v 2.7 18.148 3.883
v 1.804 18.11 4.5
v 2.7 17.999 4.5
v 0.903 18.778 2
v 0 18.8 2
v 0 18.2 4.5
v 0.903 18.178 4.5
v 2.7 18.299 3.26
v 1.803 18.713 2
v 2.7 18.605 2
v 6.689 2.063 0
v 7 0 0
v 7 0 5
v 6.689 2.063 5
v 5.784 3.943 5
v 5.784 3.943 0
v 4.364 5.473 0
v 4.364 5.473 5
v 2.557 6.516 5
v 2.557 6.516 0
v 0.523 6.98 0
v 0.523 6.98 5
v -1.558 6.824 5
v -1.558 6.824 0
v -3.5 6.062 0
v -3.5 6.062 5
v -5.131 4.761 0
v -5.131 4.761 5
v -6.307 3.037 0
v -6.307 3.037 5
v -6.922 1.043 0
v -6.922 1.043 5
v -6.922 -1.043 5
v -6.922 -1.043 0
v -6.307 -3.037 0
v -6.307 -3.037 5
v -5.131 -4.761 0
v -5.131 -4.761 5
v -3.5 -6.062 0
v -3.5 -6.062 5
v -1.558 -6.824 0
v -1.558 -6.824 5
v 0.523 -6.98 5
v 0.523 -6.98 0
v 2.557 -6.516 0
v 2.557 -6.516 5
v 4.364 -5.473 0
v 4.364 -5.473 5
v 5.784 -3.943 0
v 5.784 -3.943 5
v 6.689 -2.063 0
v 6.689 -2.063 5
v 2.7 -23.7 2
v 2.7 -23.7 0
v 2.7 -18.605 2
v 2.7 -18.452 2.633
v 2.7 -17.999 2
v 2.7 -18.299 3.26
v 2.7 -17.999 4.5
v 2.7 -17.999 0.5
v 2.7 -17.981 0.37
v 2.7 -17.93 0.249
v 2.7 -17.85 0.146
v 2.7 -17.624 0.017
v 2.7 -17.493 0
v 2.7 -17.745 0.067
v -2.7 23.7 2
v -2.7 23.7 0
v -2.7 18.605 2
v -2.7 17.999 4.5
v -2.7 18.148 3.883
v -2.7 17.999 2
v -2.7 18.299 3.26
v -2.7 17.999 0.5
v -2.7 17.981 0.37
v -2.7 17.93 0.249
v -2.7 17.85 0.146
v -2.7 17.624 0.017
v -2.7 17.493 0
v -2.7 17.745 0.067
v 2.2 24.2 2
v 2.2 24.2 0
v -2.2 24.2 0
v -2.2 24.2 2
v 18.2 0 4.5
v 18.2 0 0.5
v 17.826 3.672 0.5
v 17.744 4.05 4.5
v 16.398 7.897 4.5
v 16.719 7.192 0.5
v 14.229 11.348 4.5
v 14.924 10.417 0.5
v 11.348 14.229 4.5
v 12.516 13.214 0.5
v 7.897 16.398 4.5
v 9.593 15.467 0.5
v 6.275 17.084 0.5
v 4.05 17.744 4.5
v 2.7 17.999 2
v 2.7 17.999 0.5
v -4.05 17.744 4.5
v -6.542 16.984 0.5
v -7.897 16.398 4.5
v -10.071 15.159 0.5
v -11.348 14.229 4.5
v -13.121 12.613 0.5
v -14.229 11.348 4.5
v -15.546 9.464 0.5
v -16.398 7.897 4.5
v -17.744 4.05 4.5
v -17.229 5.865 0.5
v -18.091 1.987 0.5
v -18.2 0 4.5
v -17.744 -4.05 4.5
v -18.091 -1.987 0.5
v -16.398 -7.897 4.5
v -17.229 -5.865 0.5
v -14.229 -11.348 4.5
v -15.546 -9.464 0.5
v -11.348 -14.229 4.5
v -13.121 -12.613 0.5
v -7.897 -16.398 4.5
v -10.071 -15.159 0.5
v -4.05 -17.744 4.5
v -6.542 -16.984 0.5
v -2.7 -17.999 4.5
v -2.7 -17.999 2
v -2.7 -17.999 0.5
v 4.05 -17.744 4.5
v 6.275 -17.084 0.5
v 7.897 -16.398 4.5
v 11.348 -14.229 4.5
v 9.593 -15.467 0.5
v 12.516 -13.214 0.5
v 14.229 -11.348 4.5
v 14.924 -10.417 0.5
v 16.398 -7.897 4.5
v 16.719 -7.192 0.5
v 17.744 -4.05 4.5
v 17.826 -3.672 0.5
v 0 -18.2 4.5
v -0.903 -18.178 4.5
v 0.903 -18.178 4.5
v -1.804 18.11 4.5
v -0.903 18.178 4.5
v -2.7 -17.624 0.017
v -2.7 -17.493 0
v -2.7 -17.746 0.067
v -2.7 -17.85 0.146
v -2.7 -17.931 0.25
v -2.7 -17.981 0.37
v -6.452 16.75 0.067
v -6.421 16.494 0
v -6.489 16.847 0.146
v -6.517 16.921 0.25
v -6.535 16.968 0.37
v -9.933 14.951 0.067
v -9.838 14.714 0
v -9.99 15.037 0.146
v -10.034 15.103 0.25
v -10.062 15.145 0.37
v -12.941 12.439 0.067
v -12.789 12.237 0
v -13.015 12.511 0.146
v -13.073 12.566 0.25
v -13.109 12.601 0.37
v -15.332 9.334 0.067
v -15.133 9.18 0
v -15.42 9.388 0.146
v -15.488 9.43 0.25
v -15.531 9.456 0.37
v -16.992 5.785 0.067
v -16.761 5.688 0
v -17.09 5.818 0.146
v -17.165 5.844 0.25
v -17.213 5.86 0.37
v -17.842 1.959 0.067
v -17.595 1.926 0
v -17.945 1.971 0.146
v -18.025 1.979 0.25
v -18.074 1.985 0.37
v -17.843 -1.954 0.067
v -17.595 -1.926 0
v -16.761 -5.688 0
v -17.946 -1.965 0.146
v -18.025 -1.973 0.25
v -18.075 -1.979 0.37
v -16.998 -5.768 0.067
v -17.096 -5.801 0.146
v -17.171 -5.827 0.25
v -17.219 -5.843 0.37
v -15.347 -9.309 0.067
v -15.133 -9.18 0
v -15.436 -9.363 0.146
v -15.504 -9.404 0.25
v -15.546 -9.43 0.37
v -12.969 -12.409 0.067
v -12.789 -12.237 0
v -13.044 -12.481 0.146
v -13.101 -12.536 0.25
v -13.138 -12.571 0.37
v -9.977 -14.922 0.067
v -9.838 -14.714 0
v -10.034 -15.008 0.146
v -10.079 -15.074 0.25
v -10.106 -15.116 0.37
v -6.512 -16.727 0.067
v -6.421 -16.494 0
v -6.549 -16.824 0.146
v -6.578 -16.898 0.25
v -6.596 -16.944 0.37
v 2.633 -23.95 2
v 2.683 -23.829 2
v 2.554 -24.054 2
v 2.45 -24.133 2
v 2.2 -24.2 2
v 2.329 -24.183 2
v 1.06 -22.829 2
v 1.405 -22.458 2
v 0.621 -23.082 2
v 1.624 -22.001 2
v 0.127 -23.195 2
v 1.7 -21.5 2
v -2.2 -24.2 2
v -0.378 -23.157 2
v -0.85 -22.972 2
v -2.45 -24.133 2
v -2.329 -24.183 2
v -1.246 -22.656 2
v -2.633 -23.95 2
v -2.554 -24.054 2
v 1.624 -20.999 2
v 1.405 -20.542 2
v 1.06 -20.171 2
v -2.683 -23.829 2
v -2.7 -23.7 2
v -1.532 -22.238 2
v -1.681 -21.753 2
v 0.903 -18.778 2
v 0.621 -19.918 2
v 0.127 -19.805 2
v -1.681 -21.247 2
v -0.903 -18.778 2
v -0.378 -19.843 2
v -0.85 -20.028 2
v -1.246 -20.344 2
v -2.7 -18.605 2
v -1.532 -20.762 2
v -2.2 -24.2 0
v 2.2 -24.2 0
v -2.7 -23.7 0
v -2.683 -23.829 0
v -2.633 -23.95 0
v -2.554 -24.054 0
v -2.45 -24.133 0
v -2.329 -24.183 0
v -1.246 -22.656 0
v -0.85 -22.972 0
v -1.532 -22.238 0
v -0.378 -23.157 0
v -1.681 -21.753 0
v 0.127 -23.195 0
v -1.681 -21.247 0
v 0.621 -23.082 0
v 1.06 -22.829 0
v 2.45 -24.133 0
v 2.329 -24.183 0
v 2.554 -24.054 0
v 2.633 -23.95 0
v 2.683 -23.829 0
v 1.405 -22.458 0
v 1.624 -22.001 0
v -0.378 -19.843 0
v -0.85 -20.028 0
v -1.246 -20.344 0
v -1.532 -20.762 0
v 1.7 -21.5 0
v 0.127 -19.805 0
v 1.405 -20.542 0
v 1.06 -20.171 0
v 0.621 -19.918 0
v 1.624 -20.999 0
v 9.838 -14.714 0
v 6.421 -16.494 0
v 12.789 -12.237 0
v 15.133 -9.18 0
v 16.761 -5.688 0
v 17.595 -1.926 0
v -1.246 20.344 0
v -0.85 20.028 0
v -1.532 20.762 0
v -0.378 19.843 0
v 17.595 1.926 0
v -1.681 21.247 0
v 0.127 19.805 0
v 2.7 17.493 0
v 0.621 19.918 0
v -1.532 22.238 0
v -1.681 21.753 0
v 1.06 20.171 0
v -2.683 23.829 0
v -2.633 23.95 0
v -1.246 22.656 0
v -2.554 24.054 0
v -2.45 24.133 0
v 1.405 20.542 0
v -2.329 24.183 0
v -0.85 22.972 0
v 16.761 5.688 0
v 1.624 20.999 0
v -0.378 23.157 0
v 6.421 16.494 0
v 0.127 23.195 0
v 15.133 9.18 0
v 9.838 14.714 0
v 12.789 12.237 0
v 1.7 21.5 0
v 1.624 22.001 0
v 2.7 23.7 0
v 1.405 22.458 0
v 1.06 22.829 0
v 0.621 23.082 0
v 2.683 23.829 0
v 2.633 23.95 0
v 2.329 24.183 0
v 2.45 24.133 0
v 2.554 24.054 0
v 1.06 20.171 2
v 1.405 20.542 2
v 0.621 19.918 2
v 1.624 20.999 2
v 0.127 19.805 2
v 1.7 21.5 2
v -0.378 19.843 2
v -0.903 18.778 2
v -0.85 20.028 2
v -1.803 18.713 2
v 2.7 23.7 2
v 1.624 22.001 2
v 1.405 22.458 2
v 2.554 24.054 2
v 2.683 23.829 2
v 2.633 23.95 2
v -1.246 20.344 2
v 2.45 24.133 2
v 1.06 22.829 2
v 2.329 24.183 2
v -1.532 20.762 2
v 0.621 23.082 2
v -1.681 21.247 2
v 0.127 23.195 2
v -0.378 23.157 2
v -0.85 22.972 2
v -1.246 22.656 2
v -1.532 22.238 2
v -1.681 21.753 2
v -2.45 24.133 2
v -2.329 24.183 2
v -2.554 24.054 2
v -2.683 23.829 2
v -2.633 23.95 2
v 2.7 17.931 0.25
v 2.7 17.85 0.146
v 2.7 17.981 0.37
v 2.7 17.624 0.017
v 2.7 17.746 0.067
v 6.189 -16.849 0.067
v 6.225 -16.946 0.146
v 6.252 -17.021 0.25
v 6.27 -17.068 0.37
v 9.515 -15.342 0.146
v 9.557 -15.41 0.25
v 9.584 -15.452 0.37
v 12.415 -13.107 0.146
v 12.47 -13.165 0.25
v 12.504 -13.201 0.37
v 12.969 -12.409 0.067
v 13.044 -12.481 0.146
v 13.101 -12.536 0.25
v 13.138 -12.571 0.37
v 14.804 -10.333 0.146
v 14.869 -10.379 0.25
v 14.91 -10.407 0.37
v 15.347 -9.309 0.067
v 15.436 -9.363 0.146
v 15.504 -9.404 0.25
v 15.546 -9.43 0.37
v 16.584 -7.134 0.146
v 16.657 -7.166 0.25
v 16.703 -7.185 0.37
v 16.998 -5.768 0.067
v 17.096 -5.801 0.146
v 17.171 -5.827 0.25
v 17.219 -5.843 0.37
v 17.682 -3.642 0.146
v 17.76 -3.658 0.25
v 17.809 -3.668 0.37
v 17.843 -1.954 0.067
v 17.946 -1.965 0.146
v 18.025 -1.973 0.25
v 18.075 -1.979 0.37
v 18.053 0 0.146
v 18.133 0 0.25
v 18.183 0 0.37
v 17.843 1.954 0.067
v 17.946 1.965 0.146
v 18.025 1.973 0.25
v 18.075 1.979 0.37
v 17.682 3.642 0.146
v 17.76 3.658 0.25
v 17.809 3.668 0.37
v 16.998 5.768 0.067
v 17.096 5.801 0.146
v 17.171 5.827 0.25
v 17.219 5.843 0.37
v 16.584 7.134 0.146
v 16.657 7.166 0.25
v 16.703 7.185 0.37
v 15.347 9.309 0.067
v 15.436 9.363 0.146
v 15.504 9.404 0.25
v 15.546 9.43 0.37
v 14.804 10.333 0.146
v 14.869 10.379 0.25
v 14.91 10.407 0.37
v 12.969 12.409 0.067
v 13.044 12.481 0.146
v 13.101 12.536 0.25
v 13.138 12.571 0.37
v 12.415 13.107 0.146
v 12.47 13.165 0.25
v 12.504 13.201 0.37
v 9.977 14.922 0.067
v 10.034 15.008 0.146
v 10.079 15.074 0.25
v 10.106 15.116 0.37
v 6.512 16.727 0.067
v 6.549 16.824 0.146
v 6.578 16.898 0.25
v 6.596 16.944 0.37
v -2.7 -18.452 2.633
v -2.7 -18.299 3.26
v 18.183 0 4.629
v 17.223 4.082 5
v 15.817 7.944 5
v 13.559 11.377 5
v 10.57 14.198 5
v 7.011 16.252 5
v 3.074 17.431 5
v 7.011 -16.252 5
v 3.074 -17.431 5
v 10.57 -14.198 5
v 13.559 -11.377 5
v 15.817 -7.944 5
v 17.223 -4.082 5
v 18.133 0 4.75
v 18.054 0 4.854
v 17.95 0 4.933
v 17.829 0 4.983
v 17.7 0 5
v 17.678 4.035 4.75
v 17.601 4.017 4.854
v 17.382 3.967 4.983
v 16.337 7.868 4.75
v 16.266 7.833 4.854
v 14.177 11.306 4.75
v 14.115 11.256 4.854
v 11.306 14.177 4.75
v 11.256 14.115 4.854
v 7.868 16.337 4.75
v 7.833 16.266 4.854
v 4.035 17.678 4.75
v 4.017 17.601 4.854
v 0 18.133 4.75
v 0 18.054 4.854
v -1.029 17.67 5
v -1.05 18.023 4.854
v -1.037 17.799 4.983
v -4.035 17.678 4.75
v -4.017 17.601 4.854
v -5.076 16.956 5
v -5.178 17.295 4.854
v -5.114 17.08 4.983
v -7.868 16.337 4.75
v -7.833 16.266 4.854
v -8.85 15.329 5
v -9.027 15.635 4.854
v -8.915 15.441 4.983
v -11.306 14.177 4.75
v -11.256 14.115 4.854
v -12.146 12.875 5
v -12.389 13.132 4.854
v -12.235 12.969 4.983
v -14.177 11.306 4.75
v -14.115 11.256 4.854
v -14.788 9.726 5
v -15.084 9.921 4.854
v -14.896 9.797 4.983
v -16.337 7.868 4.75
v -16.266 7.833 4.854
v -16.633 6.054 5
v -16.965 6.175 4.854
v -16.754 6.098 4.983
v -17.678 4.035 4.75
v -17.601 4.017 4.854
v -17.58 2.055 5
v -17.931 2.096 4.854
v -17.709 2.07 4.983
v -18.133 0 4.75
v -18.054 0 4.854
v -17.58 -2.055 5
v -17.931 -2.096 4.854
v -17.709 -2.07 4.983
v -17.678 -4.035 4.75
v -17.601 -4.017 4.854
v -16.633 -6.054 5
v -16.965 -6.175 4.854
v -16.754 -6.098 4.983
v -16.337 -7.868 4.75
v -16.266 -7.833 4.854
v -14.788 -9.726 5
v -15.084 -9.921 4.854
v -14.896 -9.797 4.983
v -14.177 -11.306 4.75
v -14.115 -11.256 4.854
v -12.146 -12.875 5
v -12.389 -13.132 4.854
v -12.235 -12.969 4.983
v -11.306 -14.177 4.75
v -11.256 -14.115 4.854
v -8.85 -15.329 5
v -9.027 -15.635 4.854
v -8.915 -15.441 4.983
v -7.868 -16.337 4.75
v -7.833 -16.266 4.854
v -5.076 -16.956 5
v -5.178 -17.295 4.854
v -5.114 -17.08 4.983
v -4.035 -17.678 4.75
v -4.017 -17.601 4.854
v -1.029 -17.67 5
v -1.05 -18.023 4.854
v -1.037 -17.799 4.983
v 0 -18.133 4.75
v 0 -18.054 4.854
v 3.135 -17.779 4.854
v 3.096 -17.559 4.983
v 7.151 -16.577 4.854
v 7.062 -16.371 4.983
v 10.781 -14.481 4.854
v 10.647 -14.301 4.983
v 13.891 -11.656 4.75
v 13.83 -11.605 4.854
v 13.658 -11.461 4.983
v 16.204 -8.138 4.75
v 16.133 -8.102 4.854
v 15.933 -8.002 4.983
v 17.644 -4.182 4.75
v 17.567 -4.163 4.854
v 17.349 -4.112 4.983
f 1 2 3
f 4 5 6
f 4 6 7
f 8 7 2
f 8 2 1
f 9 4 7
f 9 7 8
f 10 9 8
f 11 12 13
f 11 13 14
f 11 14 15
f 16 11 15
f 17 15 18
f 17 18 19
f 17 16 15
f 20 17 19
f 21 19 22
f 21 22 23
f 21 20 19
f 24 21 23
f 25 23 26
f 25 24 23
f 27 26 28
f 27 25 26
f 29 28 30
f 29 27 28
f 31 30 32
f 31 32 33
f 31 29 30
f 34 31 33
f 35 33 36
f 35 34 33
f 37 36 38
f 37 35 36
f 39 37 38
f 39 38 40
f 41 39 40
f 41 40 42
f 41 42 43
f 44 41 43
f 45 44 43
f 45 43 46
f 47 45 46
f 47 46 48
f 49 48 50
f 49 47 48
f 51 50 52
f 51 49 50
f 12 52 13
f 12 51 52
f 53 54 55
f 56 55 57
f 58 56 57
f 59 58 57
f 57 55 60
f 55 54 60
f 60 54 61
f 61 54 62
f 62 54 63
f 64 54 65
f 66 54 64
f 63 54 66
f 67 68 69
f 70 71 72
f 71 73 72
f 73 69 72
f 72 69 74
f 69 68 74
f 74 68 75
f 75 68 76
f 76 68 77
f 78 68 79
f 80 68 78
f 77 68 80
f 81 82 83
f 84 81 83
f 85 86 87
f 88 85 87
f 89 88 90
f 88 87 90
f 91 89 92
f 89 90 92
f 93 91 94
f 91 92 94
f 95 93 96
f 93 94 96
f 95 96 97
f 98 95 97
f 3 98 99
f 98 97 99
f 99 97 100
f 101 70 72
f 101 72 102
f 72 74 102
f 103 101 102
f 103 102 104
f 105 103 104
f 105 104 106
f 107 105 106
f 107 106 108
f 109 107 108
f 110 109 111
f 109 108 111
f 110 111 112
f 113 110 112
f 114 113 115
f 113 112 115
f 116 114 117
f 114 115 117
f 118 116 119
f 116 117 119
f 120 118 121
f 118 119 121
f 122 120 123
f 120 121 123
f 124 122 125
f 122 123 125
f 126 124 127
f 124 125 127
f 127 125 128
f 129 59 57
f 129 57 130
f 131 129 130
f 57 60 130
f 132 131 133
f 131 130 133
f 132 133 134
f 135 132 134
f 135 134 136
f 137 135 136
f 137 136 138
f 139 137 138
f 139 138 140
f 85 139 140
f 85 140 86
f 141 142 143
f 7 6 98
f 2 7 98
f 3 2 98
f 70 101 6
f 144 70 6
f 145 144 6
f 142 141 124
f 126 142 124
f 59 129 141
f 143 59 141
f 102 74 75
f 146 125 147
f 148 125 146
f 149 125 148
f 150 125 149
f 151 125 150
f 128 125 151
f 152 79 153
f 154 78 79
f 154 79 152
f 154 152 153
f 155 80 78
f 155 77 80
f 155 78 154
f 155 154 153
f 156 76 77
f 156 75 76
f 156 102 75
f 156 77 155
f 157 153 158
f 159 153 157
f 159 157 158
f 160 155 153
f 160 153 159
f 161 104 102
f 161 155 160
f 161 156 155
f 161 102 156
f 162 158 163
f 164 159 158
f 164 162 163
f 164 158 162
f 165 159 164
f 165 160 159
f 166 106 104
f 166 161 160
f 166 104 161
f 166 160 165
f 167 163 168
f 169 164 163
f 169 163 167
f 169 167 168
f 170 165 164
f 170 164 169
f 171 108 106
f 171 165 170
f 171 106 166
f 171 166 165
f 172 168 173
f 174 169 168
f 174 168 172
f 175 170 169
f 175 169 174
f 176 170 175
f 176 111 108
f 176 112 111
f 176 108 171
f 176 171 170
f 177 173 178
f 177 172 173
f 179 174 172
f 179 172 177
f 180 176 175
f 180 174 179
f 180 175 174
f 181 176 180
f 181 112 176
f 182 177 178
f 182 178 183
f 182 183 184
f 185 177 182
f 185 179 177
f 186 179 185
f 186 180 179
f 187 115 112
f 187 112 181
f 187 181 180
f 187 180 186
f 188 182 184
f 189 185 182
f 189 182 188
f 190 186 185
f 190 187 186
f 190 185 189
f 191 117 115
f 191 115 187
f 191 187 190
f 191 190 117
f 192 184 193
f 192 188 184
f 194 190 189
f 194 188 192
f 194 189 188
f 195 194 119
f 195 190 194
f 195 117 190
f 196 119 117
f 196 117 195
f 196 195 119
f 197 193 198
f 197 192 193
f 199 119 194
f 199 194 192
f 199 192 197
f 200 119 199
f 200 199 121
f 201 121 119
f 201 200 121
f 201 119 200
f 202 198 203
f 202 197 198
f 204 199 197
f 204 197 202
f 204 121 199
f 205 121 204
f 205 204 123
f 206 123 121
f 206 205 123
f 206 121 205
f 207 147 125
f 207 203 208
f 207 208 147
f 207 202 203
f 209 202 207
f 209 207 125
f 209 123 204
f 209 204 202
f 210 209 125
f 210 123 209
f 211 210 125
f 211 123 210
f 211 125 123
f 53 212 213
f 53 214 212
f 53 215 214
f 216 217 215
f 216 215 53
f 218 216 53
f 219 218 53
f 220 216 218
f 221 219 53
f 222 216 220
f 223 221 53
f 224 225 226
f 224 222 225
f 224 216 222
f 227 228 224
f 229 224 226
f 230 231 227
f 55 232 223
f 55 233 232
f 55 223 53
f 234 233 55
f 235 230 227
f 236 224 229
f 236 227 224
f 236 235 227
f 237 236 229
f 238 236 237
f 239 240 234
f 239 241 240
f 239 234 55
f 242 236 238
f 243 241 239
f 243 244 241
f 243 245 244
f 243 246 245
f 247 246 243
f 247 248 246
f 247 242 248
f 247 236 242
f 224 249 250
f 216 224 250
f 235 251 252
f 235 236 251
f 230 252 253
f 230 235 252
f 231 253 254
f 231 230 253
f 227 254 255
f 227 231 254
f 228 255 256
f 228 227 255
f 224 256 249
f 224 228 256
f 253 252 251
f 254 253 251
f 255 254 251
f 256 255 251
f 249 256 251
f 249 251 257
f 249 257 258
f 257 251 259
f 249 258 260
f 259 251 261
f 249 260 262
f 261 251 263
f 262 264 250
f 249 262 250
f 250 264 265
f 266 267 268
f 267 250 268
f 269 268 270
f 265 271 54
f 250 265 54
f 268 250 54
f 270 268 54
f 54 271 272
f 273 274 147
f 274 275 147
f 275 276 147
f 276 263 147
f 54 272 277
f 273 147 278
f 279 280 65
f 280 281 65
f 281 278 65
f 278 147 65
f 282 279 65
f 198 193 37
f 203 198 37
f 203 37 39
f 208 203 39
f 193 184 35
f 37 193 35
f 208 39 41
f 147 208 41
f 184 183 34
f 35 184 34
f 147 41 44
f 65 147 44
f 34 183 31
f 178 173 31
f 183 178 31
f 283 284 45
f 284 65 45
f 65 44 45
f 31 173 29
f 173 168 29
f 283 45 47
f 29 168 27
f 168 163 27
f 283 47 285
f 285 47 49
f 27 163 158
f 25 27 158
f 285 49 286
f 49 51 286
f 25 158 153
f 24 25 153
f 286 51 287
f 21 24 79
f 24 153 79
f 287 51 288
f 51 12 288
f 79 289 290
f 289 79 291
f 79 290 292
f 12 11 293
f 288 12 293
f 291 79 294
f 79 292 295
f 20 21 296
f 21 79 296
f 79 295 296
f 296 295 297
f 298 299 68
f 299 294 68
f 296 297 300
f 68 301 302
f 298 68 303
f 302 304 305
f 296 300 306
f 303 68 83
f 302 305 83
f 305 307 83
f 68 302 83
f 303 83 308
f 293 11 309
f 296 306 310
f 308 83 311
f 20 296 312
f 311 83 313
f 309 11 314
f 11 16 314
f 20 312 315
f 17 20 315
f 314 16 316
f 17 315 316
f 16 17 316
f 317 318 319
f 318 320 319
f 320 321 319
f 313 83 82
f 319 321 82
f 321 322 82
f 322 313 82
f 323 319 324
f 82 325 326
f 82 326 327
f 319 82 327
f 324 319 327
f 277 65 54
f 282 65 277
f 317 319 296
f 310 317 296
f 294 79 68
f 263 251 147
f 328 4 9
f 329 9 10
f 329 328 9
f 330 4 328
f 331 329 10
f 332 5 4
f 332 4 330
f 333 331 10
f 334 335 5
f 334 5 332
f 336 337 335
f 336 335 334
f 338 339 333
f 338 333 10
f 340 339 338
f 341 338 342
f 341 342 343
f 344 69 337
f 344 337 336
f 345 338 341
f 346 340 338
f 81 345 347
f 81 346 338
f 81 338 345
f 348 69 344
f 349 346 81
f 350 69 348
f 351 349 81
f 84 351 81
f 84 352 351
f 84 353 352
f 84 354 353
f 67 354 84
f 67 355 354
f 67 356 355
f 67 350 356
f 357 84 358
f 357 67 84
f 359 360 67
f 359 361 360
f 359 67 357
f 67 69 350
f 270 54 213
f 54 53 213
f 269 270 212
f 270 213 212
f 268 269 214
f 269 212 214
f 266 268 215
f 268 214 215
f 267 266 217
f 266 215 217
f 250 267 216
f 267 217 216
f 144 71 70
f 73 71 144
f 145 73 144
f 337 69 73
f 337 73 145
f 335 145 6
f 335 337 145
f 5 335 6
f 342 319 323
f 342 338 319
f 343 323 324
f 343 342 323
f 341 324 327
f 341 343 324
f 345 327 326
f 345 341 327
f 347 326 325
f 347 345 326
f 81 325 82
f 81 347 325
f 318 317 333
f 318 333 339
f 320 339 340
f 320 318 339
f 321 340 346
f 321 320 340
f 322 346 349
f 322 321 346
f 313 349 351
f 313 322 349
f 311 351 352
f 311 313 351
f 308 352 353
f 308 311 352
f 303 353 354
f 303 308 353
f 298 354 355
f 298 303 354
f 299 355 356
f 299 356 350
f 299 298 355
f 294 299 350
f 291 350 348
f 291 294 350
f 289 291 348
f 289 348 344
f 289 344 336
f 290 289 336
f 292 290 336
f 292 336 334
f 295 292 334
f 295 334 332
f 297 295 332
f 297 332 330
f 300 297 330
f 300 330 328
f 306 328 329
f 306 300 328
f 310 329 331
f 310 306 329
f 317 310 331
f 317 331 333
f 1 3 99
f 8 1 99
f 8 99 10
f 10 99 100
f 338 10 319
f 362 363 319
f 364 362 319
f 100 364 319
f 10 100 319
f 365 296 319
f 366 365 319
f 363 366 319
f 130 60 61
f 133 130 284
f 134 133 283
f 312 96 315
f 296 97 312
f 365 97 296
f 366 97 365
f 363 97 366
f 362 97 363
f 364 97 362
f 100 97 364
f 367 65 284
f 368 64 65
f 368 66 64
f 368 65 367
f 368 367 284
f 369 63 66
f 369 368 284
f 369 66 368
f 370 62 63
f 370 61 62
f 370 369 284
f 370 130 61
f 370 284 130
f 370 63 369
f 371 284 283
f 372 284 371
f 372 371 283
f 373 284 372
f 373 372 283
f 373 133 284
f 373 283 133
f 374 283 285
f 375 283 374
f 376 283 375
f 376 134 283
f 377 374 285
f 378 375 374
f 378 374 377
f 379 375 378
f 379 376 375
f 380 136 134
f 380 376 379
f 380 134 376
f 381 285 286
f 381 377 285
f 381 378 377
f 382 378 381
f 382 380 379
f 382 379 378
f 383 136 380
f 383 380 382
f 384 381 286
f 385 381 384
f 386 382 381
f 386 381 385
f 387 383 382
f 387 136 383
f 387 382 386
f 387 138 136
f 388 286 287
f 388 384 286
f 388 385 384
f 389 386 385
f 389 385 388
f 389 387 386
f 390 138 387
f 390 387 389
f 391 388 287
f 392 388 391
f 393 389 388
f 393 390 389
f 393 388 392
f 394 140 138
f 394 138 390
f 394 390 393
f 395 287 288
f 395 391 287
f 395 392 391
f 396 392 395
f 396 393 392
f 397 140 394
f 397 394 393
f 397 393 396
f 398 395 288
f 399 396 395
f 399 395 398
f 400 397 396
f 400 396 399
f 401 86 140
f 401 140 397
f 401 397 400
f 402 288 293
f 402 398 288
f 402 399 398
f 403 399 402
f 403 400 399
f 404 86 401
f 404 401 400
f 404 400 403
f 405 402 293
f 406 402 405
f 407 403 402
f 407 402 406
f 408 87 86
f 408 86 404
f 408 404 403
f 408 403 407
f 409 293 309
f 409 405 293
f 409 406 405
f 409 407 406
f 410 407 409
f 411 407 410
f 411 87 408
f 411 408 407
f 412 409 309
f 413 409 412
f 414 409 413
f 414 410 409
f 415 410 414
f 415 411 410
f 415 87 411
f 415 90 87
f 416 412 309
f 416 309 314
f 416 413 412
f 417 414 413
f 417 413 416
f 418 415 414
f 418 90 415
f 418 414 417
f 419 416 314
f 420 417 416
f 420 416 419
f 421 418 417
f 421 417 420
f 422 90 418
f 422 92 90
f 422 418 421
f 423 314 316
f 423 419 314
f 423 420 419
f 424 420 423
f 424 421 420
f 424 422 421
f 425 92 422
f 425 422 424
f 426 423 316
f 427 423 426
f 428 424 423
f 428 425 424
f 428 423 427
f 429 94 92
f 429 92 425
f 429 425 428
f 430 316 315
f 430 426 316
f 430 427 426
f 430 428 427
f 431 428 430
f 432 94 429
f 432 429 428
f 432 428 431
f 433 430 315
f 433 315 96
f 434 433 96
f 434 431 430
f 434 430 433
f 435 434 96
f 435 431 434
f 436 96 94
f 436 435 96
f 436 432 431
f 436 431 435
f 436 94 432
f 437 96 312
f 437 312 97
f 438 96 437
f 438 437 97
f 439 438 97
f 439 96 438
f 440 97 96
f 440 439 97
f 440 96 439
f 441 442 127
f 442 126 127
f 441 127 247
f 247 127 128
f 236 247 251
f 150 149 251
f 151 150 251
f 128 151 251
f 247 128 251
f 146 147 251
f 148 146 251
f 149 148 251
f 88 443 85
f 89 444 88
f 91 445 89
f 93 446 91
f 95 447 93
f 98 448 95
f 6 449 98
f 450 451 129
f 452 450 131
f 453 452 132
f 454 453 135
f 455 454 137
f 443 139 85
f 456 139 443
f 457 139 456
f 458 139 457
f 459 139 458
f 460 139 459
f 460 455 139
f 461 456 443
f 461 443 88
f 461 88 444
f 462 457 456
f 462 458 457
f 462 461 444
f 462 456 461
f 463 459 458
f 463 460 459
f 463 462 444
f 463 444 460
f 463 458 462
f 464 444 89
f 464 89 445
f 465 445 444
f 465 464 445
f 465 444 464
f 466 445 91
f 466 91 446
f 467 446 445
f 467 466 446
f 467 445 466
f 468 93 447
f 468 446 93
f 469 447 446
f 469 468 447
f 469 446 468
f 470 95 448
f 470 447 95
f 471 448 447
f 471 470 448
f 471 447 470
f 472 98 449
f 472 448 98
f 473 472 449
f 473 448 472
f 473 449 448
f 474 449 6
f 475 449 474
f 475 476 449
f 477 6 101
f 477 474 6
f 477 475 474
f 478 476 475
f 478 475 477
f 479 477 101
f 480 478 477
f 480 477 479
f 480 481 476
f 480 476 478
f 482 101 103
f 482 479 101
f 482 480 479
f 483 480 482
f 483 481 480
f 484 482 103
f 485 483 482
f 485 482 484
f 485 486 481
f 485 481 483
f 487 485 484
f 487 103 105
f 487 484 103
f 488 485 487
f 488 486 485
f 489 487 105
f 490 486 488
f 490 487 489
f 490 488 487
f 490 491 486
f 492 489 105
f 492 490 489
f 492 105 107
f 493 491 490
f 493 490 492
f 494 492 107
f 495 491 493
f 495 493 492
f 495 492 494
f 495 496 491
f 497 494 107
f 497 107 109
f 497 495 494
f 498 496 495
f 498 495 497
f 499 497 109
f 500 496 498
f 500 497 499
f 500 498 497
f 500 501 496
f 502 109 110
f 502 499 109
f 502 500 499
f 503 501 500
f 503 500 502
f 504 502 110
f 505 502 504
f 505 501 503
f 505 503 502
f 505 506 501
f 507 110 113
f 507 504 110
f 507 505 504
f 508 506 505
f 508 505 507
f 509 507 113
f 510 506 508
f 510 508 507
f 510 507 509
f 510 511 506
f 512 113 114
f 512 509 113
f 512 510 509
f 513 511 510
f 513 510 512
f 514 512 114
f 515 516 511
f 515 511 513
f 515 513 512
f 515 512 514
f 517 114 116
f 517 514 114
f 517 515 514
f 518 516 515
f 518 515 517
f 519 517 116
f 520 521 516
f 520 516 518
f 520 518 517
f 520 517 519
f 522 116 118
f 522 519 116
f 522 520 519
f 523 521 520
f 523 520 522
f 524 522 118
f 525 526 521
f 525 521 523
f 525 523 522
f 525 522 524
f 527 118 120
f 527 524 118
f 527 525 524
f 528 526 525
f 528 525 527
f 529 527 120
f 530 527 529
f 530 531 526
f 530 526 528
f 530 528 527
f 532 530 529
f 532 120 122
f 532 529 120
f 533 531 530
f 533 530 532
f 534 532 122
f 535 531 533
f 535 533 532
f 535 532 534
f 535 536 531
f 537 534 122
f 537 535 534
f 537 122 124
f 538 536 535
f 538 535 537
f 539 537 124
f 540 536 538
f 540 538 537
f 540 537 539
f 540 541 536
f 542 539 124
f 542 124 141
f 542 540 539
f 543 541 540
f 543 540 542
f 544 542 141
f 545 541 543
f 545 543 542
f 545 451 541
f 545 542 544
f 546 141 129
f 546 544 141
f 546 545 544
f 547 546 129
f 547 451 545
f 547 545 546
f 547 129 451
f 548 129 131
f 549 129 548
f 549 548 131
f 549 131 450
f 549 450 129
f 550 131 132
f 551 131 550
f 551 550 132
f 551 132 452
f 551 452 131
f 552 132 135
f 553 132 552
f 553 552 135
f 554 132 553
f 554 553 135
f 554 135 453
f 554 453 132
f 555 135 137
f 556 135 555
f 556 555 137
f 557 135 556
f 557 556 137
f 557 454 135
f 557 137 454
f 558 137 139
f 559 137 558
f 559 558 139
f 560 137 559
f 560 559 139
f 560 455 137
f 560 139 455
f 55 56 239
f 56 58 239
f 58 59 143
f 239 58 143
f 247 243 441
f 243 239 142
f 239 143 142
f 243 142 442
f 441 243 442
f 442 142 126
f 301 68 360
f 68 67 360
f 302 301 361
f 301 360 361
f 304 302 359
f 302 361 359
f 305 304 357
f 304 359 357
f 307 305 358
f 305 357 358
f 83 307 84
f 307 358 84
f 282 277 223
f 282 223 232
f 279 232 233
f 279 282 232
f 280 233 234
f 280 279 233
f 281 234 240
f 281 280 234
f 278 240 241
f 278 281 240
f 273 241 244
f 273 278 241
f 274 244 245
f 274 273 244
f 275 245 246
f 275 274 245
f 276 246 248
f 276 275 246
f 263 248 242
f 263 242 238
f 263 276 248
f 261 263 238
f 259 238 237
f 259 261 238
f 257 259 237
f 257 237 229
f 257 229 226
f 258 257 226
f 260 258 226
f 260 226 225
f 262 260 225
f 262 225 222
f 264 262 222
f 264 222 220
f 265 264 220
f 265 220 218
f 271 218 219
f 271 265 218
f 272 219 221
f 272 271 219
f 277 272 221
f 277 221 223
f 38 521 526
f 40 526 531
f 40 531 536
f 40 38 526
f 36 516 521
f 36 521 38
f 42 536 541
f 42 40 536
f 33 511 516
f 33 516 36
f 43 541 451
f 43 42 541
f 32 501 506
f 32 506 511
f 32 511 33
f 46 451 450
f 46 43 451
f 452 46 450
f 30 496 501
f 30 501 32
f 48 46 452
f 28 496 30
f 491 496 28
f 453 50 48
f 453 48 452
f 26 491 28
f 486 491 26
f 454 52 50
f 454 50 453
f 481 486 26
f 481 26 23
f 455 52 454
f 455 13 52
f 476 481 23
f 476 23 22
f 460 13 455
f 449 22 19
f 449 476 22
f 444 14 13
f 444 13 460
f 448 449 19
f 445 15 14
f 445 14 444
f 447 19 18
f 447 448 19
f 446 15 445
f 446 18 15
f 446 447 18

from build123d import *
from OCP.BRepFilletAPI import BRepFilletAPI_MakeChamfer

# Parameters (mm, degrees)
CROQUIS2_R              = 18.2
CROQUIS2_R_2            = 7
SALIENTE_EXTRUIR1_DEPTH = 5
CROQUIS2_3_R            = 1.7
SALIENTE_EXTRUIR2_DEPTH = 2
REDONDEO1_R             = 0.5
REDONDEO4_R             = 0.5
CHAFL_N2_SIZE           = 0.6
CHAFL_N2_SIZE_2         = 2.5


with BuildPart() as part:
    # Croquis2 → Saliente-Extruir1 (new body)
    with BuildSketch(Plane(origin=(0, 0, 0), x_dir=(0, 1, 0), z_dir=(0, 0, 1))):
        with Locations(Location((0, 0, 0), (0, 0, 270))):
            Circle(CROQUIS2_R)
        with Locations(Location((0, 0, 0), (0, 0, 270))):
            Circle(CROQUIS2_R_2, mode=Mode.SUBTRACT)
    extrude(amount=SALIENTE_EXTRUIR1_DEPTH)

    # Croquis2<3> → Saliente-Extruir2 (add)
    # profile 1 of 2: a face of its own
    with BuildSketch(Plane(origin=(0, 0, 0), x_dir=(0, 1, 0), z_dir=(0, 0, 1))):
        with BuildLine():
            Line((-24.2, -2.7), (-17.998611058, -2.7))
            ThreePointArc((-17.998611058, -2.7), (-18.2, 0), (-17.998611058, 2.7))
            Line((-17.998611058, 2.7), (-24.2, 2.7))
            Line((-24.2, 2.7), (-24.2, -2.7))
        make_face()
        with Locations(Location((-21.5, 0, 0), (0, 0, 270))):
            Circle(CROQUIS2_3_R, mode=Mode.SUBTRACT)
    # profile 2 of 2: a face of its own
    with BuildSketch(Plane(origin=(0, 0, 0), x_dir=(0, 1, 0), z_dir=(0, 0, 1))):
        with BuildLine():
            ThreePointArc((18.2, 0), (18.149582932, -1.353750116), (17.998611058, -2.7))
            Line((17.998611058, -2.7), (24.2, -2.7))
            Line((24.2, -2.7), (24.2, 2.7))
            Line((24.2, 2.7), (17.998611058, 2.7))
            ThreePointArc((17.998611058, 2.7), (18.149582932, 1.353750116), (18.2, 0))
        make_face()
        with Locations(Location((21.5, 0, 0), (0, 0, 270))):
            Circle(CROQUIS2_3_R, mode=Mode.SUBTRACT)
    extrude(amount=SALIENTE_EXTRUIR2_DEPTH)

    # Redondeo1
    redondeo1_edges = [part.edges().sort_by_distance(p)[0] for p in [
        (-2.7, -24.2, 1),
        (2.7, -24.2, 1),
        (2.7, 24.2, 1),
        (-2.7, 24.2, 1),
    ]]
    fillet(redondeo1_edges, radius=REDONDEO1_R)

    # Redondeo4
    redondeo4_edges = [part.edges().sort_by_distance(p)[0] for p in [
        (13.790939054, 11.87644728, 0),
        (-18.2, 0, 5),
        (-18.2, 0, 0),
    ]]
    fillet(redondeo4_edges, radius=REDONDEO4_R)

    # Chaflán2
    chafl_n2_edges_1 = [part.edges().sort_by_distance(p)[0] for p in [
        (0, -18.2, 2),
    ]]
    chafl_n2_side_1 = [part.faces().sort_by_distance(p)[0] for p in [
        (0, -18.212, 2),
    ]]
    chafl_n2_edges_2 = [part.edges().sort_by_distance(p)[0] for p in [
        (0, 18.2, 2),
    ]]
    chafl_n2_side_2 = [part.faces().sort_by_distance(p)[0] for p in [
        (0, 18.2, 2.012),
    ]]
    chafl_n2 = BRepFilletAPI_MakeChamfer(part.part.solid().wrapped)
    for e in chafl_n2_edges_1:
        chafl_n2.Add(CHAFL_N2_SIZE - 0.0001, CHAFL_N2_SIZE_2 - 0.0001, e.wrapped, chafl_n2_side_1[0].wrapped)
    for e in chafl_n2_edges_2:
        chafl_n2.Add(CHAFL_N2_SIZE_2 - 0.0001, CHAFL_N2_SIZE - 0.0001, e.wrapped, chafl_n2_side_2[0].wrapped)
    add(Compound.cast(chafl_n2.Shape()), mode=Mode.REPLACE)  # a hair under: the kernel refuses the full size


solid = part.part
